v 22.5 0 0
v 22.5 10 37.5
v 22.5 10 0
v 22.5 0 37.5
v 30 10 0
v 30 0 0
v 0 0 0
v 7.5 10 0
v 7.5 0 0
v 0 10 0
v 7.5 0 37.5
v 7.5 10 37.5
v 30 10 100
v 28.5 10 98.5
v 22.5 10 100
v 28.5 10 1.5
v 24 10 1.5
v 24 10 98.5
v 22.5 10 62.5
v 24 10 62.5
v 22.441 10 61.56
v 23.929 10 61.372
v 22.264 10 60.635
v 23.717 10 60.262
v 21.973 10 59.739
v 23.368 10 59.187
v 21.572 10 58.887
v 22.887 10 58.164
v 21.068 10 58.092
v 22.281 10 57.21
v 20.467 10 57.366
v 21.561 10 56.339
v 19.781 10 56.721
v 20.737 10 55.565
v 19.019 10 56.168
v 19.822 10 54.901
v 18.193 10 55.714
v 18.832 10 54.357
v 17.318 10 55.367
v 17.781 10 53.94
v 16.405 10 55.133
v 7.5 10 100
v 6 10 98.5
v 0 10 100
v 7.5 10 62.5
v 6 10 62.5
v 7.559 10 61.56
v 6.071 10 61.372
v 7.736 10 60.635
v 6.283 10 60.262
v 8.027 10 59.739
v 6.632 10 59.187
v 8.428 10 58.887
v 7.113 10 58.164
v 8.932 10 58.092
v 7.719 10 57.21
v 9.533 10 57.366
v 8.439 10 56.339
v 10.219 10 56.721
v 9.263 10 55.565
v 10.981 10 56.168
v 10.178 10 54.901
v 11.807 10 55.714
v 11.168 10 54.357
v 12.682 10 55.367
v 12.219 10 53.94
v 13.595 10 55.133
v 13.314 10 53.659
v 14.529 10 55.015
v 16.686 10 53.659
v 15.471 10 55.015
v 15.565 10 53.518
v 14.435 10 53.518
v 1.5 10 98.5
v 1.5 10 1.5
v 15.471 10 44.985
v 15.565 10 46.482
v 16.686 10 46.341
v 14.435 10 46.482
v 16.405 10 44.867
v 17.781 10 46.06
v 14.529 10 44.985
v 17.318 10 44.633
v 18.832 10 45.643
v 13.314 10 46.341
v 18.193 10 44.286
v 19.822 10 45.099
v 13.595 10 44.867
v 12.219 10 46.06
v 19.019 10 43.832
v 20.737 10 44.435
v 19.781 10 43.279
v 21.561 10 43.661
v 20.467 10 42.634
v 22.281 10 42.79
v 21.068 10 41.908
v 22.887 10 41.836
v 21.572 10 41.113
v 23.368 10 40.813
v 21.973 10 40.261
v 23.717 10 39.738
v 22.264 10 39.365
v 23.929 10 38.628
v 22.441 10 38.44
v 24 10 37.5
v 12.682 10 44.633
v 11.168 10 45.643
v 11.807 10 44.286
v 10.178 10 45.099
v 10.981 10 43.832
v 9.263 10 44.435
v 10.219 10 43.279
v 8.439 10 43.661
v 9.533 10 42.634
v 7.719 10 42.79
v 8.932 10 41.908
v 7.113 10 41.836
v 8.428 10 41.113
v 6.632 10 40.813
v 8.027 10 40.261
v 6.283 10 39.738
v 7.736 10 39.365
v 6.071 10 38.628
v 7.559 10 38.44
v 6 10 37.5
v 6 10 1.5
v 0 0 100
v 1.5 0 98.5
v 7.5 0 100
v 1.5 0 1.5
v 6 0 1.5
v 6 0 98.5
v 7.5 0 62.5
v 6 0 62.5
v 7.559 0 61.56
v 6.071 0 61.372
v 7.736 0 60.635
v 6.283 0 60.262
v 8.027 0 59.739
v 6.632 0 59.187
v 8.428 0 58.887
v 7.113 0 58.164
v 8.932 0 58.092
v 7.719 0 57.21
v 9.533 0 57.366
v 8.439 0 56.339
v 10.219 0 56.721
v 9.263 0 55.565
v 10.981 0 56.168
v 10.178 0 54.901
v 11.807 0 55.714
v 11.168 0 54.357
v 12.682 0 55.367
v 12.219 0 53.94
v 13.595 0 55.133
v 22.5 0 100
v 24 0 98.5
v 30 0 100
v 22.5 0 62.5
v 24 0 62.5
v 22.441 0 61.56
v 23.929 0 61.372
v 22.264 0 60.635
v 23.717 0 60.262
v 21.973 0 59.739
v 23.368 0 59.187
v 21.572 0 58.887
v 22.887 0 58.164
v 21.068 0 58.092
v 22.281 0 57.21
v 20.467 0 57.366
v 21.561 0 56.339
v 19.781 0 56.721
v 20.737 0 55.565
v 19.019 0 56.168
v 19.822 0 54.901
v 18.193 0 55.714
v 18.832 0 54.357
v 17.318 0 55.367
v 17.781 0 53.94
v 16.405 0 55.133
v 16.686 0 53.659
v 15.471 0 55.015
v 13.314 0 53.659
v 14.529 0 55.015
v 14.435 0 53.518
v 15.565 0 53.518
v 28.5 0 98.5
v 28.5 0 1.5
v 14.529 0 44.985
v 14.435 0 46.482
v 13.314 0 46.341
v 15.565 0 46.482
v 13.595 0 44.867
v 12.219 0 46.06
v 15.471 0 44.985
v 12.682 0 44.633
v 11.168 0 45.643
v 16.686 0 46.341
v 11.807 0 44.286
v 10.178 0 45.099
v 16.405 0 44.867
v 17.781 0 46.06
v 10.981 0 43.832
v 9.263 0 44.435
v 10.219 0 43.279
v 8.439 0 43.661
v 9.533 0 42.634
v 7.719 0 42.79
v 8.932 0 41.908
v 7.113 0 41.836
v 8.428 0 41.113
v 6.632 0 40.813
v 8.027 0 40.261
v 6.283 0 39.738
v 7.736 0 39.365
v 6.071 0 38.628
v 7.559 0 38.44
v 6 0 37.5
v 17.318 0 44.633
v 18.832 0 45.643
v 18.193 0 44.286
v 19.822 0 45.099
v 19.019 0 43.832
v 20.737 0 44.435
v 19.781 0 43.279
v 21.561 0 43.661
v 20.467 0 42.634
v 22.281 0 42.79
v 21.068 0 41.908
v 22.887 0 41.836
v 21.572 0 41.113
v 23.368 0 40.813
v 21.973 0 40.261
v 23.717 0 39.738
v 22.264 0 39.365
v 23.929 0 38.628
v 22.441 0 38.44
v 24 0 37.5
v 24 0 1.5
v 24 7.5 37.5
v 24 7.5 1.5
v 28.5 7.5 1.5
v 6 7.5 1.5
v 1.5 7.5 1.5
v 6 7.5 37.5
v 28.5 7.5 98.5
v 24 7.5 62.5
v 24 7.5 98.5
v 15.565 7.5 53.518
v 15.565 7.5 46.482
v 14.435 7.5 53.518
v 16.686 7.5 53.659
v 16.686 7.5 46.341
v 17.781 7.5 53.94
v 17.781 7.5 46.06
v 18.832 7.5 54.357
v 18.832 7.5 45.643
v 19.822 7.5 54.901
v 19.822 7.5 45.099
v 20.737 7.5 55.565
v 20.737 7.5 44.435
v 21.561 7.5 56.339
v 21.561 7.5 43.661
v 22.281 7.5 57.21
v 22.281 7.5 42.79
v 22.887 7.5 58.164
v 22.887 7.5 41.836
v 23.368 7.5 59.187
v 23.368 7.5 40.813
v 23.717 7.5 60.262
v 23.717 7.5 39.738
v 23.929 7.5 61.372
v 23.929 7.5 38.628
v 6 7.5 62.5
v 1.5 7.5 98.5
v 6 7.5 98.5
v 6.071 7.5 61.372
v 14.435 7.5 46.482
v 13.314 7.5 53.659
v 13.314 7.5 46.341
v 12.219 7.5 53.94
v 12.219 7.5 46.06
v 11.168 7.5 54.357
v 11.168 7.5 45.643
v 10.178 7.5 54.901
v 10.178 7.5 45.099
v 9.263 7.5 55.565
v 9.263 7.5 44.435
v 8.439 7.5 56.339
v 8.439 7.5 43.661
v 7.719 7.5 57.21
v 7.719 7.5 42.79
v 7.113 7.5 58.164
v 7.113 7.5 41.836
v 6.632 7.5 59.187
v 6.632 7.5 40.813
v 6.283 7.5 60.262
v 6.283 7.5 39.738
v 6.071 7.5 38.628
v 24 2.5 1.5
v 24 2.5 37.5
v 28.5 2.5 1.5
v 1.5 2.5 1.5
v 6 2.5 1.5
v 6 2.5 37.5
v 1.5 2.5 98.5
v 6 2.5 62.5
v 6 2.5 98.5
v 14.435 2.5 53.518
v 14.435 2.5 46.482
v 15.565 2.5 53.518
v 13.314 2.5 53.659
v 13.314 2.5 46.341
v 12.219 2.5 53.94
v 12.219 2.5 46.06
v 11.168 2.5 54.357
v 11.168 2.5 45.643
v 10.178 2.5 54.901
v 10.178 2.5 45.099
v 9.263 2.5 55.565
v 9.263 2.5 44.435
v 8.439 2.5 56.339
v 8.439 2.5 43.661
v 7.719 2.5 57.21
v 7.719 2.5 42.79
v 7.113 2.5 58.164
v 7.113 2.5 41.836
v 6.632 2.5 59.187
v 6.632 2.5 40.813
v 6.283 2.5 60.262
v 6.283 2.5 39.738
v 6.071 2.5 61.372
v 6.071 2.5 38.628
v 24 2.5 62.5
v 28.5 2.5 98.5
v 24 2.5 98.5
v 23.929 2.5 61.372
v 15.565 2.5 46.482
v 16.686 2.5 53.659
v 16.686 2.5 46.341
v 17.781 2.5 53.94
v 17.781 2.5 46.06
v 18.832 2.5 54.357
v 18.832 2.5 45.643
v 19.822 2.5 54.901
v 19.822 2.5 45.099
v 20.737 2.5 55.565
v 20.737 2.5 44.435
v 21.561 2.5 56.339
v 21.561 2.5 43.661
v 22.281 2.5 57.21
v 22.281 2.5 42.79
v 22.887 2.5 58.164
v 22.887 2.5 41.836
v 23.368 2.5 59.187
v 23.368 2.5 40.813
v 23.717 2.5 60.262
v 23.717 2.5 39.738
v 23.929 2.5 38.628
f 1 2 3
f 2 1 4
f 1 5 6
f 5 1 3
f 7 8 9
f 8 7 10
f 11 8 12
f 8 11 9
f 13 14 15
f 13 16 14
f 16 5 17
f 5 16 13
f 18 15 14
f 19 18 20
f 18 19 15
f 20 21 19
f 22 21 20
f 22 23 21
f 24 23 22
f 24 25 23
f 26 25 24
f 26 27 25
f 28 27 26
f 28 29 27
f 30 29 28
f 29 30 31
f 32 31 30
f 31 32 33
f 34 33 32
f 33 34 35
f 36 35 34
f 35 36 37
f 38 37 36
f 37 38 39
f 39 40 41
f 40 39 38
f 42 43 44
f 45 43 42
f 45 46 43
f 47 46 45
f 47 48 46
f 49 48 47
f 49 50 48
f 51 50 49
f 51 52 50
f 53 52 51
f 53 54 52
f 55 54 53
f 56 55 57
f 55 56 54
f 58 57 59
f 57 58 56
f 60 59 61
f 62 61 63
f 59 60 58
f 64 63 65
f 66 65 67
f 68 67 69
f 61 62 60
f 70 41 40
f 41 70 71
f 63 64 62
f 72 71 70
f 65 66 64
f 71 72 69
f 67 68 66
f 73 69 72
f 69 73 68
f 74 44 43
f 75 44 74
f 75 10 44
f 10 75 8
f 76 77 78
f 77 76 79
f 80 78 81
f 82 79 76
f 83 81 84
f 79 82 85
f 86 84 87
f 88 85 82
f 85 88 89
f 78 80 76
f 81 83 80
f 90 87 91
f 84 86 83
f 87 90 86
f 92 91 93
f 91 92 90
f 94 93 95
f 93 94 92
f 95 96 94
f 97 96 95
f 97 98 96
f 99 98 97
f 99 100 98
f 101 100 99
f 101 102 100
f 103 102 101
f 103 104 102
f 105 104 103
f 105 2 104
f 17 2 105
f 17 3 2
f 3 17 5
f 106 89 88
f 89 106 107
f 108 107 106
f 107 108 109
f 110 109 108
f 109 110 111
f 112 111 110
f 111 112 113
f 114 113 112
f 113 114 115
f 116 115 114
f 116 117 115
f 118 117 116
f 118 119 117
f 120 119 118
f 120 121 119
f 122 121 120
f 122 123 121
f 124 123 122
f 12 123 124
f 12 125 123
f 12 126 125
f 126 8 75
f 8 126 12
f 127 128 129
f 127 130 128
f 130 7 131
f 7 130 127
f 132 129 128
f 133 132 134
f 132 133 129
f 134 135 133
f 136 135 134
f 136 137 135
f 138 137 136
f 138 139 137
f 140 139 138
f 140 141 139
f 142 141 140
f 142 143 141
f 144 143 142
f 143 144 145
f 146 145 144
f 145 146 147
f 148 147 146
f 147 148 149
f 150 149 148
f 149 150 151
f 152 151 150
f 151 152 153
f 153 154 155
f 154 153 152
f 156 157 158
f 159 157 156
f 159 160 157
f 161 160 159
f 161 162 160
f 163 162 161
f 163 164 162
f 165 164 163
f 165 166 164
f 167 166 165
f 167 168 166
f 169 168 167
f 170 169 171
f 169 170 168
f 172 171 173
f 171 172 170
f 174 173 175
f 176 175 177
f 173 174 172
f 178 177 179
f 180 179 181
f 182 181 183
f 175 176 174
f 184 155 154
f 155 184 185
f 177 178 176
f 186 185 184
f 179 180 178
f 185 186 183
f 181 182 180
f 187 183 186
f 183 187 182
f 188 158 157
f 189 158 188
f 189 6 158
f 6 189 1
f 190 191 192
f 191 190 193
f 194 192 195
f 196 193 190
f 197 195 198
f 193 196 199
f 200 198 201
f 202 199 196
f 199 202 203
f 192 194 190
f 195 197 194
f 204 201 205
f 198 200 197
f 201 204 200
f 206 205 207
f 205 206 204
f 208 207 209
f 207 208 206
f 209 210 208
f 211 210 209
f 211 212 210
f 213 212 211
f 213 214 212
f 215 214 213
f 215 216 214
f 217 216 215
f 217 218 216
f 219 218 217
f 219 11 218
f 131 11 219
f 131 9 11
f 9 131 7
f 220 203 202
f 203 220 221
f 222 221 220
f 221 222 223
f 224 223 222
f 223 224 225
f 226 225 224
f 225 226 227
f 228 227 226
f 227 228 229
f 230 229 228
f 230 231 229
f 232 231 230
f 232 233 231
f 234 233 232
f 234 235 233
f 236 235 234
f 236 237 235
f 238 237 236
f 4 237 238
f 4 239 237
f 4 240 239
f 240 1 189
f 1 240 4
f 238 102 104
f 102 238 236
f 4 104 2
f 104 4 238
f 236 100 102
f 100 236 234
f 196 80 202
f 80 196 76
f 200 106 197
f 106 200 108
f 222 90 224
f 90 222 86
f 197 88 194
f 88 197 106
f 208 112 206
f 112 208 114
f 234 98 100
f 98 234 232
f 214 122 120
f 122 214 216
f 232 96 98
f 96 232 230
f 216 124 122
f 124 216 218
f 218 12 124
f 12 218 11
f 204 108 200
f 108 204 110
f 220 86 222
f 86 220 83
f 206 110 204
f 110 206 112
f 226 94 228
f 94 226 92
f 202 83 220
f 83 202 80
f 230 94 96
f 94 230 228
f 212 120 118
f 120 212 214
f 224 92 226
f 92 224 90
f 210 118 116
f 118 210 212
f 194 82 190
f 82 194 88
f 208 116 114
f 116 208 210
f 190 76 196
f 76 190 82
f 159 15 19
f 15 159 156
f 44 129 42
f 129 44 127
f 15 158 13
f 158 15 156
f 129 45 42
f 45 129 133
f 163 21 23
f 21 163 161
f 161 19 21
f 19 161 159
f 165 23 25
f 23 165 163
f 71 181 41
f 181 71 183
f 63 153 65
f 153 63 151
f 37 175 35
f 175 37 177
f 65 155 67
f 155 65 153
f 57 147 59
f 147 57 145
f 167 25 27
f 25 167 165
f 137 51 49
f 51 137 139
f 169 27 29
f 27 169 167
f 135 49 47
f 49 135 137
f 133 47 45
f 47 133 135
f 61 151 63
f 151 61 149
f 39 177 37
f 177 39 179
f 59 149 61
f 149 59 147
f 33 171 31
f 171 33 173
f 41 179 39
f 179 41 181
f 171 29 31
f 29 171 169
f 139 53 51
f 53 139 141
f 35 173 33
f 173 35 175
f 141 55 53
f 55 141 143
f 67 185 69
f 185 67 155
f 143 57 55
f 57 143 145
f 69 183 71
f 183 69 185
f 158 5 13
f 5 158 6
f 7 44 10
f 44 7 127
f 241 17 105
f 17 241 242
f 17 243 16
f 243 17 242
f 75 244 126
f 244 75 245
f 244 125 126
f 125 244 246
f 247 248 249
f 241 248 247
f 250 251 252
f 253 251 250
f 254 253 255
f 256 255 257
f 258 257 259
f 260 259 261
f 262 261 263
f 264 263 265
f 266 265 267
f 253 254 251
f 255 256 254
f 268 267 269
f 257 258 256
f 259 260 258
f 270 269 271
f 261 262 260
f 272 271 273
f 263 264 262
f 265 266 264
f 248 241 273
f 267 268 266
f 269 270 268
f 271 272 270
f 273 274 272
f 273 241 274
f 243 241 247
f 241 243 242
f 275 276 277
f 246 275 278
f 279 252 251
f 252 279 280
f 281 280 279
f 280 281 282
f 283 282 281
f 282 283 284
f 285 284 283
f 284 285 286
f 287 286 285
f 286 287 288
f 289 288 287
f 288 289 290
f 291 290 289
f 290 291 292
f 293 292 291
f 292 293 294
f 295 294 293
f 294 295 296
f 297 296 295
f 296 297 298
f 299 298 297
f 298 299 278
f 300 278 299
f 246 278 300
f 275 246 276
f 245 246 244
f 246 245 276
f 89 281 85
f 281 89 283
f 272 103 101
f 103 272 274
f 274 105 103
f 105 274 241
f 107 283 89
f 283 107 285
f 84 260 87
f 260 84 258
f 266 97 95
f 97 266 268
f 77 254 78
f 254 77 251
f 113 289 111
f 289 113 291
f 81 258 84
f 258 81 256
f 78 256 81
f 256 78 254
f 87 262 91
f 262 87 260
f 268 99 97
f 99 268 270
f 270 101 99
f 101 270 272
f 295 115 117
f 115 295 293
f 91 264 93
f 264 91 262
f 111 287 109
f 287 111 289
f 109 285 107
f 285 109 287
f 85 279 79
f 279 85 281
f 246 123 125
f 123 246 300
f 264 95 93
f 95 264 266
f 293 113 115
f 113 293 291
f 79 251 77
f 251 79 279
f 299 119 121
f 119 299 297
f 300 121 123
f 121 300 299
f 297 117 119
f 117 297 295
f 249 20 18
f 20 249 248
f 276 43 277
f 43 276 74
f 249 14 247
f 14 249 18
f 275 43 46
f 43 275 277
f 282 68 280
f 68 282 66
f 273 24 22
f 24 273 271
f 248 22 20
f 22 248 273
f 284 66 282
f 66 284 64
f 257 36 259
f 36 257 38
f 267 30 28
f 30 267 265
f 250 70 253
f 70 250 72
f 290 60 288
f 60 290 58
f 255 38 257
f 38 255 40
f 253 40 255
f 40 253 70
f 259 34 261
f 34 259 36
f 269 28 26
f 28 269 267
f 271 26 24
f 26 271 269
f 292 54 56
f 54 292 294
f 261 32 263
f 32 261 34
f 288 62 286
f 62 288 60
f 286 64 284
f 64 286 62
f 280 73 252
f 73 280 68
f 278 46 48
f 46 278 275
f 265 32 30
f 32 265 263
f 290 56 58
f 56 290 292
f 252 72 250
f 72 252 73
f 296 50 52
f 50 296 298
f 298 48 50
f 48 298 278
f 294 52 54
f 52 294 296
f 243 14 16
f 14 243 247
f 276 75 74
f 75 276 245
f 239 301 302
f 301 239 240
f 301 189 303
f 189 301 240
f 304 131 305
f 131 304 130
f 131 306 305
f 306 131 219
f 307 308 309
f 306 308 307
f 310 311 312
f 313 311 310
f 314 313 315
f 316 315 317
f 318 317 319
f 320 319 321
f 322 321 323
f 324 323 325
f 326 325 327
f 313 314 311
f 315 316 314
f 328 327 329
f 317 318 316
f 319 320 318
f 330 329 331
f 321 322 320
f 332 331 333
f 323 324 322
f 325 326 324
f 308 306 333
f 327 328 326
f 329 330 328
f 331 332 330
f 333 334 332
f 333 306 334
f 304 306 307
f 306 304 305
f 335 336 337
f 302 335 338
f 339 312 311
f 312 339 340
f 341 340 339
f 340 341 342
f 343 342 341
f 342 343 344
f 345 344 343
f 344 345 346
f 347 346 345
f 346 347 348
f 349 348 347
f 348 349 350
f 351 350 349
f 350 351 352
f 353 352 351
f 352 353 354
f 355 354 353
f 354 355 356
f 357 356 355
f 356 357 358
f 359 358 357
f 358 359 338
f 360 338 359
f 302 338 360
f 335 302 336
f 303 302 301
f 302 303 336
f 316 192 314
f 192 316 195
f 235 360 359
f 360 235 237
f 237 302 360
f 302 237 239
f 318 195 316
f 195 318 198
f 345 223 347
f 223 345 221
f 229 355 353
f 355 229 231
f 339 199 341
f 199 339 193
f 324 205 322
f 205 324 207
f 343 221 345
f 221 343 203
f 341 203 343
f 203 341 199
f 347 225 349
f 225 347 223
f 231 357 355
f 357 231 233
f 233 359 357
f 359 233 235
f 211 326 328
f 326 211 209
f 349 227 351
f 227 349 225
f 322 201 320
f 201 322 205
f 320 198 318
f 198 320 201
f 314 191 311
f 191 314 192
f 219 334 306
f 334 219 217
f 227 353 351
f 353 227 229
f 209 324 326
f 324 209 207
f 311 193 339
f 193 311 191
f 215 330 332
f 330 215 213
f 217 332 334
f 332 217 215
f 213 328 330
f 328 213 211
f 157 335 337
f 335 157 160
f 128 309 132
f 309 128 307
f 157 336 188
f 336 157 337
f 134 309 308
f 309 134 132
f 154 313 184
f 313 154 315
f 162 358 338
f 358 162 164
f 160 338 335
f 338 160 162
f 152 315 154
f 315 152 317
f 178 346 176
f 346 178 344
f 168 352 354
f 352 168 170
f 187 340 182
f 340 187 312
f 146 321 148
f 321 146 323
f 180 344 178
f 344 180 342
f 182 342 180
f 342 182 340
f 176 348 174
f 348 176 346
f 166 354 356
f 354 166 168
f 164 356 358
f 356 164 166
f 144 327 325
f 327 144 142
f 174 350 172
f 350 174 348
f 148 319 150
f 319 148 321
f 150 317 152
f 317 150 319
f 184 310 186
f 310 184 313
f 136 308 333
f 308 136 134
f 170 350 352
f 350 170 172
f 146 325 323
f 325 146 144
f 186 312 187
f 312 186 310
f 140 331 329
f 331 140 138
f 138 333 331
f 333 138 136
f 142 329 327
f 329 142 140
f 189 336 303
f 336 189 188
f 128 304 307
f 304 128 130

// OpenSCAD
$fn = $preview ? 8 : 50;

module roundedCube(width, depth, height) {
  radius = width / 2;

  color("red")
  union() {
    cube([width, depth, height]);

    rotate([90, 0, 0])
    translate([radius, height, -depth])
    cylinder(depth, radius, radius);
  }
}

module H(
  width,
  depth,
  height,
  middleSectionWidth,
  gap
) {

  offset = (width - middleSectionWidth) / 2;

  difference() {
    color("blue")
    cube([width, depth, height]);


    translate([offset, 0, 0])
    roundedCube(middleSectionWidth, depth, (height - gap) / 2);

    rotate([180, 0, 0])
    translate([offset, -depth, -height])
    roundedCube(middleSectionWidth, depth, (height - gap) / 2);
  }
}



// The thickness of the outside walls of the model
modelThickness = 1.5;

modelWidth = 30;
modelHeight = 100;
modelDepth = 10;

// The width of the GAP in the H (X-axis)
modelMiddleSectionWidth = 15;
// The width of the GAP in the H (Y-axis)
modelGap = 25;

render()
difference() {
  H(
    modelWidth,
    modelDepth,
    modelHeight,
    modelMiddleSectionWidth,
    modelGap
  );


  // The thickness of the thinnest part of the model
  thickness = 5;
  // The amount of material to be removed from the front and back of the model
  toBeRemoved = (modelDepth - thickness) / 2;

  translate([
    modelThickness,
    modelDepth - toBeRemoved,
    modelThickness
  ])
  H(
    modelWidth - modelThickness * 2,
    toBeRemoved,
    modelHeight - modelThickness * 2,
    modelMiddleSectionWidth + modelThickness * 2,
    modelGap
  );

  translate([
    modelThickness,
    0,
    modelThickness
  ])
  H(
    modelWidth - modelThickness * 2,
    toBeRemoved,
    modelHeight - modelThickness * 2,
    modelMiddleSectionWidth + modelThickness * 2,
    modelGap
  );
}
